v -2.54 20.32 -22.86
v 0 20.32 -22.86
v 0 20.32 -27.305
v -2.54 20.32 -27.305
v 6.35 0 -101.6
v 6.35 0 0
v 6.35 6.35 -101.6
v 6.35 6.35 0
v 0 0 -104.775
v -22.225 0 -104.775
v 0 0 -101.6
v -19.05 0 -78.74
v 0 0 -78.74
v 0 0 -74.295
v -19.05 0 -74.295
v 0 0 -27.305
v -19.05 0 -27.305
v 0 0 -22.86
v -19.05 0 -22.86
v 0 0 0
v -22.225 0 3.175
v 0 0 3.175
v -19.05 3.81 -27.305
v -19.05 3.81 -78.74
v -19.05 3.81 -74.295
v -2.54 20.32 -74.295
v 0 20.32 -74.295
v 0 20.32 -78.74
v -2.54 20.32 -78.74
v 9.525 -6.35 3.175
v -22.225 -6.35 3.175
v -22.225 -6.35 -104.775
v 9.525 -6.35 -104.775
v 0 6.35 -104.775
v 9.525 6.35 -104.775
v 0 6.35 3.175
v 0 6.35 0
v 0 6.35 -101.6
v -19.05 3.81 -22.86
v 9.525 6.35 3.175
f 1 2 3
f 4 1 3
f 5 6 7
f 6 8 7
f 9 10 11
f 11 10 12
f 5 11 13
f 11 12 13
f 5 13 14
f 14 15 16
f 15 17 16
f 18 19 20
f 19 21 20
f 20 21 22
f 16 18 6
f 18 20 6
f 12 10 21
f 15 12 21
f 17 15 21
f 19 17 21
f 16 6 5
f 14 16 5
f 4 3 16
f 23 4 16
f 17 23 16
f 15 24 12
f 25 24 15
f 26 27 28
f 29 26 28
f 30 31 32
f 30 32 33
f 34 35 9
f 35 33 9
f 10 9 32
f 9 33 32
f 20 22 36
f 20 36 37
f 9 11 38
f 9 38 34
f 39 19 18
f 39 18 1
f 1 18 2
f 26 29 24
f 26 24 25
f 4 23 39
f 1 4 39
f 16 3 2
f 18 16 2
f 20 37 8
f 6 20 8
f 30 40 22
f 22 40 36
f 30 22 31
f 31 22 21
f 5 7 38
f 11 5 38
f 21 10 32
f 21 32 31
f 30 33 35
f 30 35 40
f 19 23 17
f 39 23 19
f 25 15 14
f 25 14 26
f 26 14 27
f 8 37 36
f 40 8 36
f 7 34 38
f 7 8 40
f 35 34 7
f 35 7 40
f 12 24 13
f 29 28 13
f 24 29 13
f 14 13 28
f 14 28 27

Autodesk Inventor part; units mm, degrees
ref_plane "YZ Plane" through (0, 0, 0) normal (1, 0, 0) x (0, 1, 0)
ref_plane "XZ Plane" through (0, 0, 0) normal (0, 1, 0) x (-1, 0, 0)
ref_plane "XY Plane" through (0, 0, 0) normal (0, 0, 1) x (1, 0, 0)
sketch "Sketch1" plane through (0, 0, 0) normal (1, 0, 0) x (0, 1, 0)
  line L0 (0, 0) -> (38.1, 0)
  line L1 (38.1, 0) -> (38.1, -101.6)
  line L2 (38.1, -101.6) -> (0, -101.6)
  line L3 (0, -101.6) -> (0, 0)
  dimension "d0" = 101.6
  dimension "d1" = 38.1
extrude "Extrusion1" add sketch "Sketch1" along normal blind 6.35
sketch "Sketch2" plane through (0, 0, 0) normal (-1, 0, 0) x (0, 0, 1)
  line L0 (0, 0) -> (0, 38.1) projected
  line L1 (-101.6, 38.1) -> (-101.6, 0) projected
  line L2 (-101.6, 0) -> (0, 0) projected
  line L3 (0, 0) -> (-101.6, 0) projected
  line L4 (-78.74, 0) -> (-74.295, 0)
  line L5 (-74.295, 0) -> (-74.295, 20.32)
  line L6 (-74.295, 20.32) -> (-78.74, 20.32)
  line L7 (-78.74, 20.32) -> (-78.74, 0)
  line L8 (-27.305, 0) -> (-22.86, 0)
  line L9 (-22.86, 0) -> (-22.86, 20.32)
  line L10 (-22.86, 20.32) -> (-27.305, 20.32)
  line L11 (-27.305, 20.32) -> (-27.305, 0)
  dimension "d10" = 4.445
  dimension "d11" = 4.445
  dimension "d13" = 20.32
  dimension "d14" = 22.86
  dimension "d15" = 22.86
extrude "Extrusion2" add sketch "Sketch2" along normal blind 19.05
chamfer "Chamfer1" distance 16.51 angle 45 2 edges at (-19.05, 20.32, -25.0825) (-19.05, 20.32, -76.5175)
sketch "Sketch3" plane through (0, 0, -101.6) normal (0, -1, 0) x (1, 0, 0)
  line L0 (0, 0) -> (6.35, 0) projected
  line L1 (9.525, -3.175) -> (-22.225, -3.175)
  line L2 (0, 101.6) -> (6.35, 101.6) projected
  line L3 (9.525, -3.175) -> (9.525, 104.775)
  line L4 (9.525, 104.775) -> (-22.225, 104.775)
  line L5 (-22.225, -3.175) -> (-22.225, 104.775)
  line L6 (-19.05, 22.86) -> (-19.05, 27.305) projected
  line L7 (6.35, 101.6) -> (6.35, 0) projected
  dimension "d22" = 3.175
  dimension "d25" = 3.175
  dimension "d26" = 3.175
  dimension "d27" = 3.175
  dimension "d52" = 107.95
  dimension "d53" = 31.75
extrude "Extrusion3" add sketch "Sketch3" along normal blind 6.35
sketch "Sketch4" plane through (0, 0, -101.6) normal (0, 1, 0) x (1, 0, 0)
  line L0 (0, -101.6) -> (6.35, -101.6) projected
  line L1 (0, -101.6) -> (6.35, -101.6)
  line L2 (6.35, -101.6) -> (6.35, 0) projected
  line L3 (6.35, -101.6) -> (6.35, 0)
  line L4 (6.35, 0) -> (0, 0)
  line L5 (0, 0) -> (0, 3.175)
  line L6 (9.525, 3.175) -> (-22.225, 3.175) projected
  line L7 (0, 3.175) -> (9.525, 3.175)
  line L8 (9.525, 3.175) -> (9.525, -104.775) projected
  line L9 (9.525, 3.175) -> (9.525, -104.775)
  line L10 (9.525, -104.775) -> (0, -104.775)
  line L11 (-22.225, -104.775) -> (9.525, -104.775) projected
  line L12 (0, -104.775) -> (0, -101.6)
extrude "Extrusion5" add sketch "Sketch4" along normal blind 6.35
sketch "Sketch5" plane through (0, 38.1, 0) normal (0, 1, 0) x (1, 0, 0)
  line L0 (0, 0) -> (0, -3.175) projected
  line L1 (0, 0) -> (6.35, 0)
  line L2 (6.35, 0) -> (6.35, 101.6)
  line L3 (6.35, 101.6) -> (0, 101.6)
  line L4 (0, 101.6) -> (0, 0)
extrude "Extrusion6" cut sketch "Sketch5" against normal blind 38.1
properties part number "MonsterHolder"
